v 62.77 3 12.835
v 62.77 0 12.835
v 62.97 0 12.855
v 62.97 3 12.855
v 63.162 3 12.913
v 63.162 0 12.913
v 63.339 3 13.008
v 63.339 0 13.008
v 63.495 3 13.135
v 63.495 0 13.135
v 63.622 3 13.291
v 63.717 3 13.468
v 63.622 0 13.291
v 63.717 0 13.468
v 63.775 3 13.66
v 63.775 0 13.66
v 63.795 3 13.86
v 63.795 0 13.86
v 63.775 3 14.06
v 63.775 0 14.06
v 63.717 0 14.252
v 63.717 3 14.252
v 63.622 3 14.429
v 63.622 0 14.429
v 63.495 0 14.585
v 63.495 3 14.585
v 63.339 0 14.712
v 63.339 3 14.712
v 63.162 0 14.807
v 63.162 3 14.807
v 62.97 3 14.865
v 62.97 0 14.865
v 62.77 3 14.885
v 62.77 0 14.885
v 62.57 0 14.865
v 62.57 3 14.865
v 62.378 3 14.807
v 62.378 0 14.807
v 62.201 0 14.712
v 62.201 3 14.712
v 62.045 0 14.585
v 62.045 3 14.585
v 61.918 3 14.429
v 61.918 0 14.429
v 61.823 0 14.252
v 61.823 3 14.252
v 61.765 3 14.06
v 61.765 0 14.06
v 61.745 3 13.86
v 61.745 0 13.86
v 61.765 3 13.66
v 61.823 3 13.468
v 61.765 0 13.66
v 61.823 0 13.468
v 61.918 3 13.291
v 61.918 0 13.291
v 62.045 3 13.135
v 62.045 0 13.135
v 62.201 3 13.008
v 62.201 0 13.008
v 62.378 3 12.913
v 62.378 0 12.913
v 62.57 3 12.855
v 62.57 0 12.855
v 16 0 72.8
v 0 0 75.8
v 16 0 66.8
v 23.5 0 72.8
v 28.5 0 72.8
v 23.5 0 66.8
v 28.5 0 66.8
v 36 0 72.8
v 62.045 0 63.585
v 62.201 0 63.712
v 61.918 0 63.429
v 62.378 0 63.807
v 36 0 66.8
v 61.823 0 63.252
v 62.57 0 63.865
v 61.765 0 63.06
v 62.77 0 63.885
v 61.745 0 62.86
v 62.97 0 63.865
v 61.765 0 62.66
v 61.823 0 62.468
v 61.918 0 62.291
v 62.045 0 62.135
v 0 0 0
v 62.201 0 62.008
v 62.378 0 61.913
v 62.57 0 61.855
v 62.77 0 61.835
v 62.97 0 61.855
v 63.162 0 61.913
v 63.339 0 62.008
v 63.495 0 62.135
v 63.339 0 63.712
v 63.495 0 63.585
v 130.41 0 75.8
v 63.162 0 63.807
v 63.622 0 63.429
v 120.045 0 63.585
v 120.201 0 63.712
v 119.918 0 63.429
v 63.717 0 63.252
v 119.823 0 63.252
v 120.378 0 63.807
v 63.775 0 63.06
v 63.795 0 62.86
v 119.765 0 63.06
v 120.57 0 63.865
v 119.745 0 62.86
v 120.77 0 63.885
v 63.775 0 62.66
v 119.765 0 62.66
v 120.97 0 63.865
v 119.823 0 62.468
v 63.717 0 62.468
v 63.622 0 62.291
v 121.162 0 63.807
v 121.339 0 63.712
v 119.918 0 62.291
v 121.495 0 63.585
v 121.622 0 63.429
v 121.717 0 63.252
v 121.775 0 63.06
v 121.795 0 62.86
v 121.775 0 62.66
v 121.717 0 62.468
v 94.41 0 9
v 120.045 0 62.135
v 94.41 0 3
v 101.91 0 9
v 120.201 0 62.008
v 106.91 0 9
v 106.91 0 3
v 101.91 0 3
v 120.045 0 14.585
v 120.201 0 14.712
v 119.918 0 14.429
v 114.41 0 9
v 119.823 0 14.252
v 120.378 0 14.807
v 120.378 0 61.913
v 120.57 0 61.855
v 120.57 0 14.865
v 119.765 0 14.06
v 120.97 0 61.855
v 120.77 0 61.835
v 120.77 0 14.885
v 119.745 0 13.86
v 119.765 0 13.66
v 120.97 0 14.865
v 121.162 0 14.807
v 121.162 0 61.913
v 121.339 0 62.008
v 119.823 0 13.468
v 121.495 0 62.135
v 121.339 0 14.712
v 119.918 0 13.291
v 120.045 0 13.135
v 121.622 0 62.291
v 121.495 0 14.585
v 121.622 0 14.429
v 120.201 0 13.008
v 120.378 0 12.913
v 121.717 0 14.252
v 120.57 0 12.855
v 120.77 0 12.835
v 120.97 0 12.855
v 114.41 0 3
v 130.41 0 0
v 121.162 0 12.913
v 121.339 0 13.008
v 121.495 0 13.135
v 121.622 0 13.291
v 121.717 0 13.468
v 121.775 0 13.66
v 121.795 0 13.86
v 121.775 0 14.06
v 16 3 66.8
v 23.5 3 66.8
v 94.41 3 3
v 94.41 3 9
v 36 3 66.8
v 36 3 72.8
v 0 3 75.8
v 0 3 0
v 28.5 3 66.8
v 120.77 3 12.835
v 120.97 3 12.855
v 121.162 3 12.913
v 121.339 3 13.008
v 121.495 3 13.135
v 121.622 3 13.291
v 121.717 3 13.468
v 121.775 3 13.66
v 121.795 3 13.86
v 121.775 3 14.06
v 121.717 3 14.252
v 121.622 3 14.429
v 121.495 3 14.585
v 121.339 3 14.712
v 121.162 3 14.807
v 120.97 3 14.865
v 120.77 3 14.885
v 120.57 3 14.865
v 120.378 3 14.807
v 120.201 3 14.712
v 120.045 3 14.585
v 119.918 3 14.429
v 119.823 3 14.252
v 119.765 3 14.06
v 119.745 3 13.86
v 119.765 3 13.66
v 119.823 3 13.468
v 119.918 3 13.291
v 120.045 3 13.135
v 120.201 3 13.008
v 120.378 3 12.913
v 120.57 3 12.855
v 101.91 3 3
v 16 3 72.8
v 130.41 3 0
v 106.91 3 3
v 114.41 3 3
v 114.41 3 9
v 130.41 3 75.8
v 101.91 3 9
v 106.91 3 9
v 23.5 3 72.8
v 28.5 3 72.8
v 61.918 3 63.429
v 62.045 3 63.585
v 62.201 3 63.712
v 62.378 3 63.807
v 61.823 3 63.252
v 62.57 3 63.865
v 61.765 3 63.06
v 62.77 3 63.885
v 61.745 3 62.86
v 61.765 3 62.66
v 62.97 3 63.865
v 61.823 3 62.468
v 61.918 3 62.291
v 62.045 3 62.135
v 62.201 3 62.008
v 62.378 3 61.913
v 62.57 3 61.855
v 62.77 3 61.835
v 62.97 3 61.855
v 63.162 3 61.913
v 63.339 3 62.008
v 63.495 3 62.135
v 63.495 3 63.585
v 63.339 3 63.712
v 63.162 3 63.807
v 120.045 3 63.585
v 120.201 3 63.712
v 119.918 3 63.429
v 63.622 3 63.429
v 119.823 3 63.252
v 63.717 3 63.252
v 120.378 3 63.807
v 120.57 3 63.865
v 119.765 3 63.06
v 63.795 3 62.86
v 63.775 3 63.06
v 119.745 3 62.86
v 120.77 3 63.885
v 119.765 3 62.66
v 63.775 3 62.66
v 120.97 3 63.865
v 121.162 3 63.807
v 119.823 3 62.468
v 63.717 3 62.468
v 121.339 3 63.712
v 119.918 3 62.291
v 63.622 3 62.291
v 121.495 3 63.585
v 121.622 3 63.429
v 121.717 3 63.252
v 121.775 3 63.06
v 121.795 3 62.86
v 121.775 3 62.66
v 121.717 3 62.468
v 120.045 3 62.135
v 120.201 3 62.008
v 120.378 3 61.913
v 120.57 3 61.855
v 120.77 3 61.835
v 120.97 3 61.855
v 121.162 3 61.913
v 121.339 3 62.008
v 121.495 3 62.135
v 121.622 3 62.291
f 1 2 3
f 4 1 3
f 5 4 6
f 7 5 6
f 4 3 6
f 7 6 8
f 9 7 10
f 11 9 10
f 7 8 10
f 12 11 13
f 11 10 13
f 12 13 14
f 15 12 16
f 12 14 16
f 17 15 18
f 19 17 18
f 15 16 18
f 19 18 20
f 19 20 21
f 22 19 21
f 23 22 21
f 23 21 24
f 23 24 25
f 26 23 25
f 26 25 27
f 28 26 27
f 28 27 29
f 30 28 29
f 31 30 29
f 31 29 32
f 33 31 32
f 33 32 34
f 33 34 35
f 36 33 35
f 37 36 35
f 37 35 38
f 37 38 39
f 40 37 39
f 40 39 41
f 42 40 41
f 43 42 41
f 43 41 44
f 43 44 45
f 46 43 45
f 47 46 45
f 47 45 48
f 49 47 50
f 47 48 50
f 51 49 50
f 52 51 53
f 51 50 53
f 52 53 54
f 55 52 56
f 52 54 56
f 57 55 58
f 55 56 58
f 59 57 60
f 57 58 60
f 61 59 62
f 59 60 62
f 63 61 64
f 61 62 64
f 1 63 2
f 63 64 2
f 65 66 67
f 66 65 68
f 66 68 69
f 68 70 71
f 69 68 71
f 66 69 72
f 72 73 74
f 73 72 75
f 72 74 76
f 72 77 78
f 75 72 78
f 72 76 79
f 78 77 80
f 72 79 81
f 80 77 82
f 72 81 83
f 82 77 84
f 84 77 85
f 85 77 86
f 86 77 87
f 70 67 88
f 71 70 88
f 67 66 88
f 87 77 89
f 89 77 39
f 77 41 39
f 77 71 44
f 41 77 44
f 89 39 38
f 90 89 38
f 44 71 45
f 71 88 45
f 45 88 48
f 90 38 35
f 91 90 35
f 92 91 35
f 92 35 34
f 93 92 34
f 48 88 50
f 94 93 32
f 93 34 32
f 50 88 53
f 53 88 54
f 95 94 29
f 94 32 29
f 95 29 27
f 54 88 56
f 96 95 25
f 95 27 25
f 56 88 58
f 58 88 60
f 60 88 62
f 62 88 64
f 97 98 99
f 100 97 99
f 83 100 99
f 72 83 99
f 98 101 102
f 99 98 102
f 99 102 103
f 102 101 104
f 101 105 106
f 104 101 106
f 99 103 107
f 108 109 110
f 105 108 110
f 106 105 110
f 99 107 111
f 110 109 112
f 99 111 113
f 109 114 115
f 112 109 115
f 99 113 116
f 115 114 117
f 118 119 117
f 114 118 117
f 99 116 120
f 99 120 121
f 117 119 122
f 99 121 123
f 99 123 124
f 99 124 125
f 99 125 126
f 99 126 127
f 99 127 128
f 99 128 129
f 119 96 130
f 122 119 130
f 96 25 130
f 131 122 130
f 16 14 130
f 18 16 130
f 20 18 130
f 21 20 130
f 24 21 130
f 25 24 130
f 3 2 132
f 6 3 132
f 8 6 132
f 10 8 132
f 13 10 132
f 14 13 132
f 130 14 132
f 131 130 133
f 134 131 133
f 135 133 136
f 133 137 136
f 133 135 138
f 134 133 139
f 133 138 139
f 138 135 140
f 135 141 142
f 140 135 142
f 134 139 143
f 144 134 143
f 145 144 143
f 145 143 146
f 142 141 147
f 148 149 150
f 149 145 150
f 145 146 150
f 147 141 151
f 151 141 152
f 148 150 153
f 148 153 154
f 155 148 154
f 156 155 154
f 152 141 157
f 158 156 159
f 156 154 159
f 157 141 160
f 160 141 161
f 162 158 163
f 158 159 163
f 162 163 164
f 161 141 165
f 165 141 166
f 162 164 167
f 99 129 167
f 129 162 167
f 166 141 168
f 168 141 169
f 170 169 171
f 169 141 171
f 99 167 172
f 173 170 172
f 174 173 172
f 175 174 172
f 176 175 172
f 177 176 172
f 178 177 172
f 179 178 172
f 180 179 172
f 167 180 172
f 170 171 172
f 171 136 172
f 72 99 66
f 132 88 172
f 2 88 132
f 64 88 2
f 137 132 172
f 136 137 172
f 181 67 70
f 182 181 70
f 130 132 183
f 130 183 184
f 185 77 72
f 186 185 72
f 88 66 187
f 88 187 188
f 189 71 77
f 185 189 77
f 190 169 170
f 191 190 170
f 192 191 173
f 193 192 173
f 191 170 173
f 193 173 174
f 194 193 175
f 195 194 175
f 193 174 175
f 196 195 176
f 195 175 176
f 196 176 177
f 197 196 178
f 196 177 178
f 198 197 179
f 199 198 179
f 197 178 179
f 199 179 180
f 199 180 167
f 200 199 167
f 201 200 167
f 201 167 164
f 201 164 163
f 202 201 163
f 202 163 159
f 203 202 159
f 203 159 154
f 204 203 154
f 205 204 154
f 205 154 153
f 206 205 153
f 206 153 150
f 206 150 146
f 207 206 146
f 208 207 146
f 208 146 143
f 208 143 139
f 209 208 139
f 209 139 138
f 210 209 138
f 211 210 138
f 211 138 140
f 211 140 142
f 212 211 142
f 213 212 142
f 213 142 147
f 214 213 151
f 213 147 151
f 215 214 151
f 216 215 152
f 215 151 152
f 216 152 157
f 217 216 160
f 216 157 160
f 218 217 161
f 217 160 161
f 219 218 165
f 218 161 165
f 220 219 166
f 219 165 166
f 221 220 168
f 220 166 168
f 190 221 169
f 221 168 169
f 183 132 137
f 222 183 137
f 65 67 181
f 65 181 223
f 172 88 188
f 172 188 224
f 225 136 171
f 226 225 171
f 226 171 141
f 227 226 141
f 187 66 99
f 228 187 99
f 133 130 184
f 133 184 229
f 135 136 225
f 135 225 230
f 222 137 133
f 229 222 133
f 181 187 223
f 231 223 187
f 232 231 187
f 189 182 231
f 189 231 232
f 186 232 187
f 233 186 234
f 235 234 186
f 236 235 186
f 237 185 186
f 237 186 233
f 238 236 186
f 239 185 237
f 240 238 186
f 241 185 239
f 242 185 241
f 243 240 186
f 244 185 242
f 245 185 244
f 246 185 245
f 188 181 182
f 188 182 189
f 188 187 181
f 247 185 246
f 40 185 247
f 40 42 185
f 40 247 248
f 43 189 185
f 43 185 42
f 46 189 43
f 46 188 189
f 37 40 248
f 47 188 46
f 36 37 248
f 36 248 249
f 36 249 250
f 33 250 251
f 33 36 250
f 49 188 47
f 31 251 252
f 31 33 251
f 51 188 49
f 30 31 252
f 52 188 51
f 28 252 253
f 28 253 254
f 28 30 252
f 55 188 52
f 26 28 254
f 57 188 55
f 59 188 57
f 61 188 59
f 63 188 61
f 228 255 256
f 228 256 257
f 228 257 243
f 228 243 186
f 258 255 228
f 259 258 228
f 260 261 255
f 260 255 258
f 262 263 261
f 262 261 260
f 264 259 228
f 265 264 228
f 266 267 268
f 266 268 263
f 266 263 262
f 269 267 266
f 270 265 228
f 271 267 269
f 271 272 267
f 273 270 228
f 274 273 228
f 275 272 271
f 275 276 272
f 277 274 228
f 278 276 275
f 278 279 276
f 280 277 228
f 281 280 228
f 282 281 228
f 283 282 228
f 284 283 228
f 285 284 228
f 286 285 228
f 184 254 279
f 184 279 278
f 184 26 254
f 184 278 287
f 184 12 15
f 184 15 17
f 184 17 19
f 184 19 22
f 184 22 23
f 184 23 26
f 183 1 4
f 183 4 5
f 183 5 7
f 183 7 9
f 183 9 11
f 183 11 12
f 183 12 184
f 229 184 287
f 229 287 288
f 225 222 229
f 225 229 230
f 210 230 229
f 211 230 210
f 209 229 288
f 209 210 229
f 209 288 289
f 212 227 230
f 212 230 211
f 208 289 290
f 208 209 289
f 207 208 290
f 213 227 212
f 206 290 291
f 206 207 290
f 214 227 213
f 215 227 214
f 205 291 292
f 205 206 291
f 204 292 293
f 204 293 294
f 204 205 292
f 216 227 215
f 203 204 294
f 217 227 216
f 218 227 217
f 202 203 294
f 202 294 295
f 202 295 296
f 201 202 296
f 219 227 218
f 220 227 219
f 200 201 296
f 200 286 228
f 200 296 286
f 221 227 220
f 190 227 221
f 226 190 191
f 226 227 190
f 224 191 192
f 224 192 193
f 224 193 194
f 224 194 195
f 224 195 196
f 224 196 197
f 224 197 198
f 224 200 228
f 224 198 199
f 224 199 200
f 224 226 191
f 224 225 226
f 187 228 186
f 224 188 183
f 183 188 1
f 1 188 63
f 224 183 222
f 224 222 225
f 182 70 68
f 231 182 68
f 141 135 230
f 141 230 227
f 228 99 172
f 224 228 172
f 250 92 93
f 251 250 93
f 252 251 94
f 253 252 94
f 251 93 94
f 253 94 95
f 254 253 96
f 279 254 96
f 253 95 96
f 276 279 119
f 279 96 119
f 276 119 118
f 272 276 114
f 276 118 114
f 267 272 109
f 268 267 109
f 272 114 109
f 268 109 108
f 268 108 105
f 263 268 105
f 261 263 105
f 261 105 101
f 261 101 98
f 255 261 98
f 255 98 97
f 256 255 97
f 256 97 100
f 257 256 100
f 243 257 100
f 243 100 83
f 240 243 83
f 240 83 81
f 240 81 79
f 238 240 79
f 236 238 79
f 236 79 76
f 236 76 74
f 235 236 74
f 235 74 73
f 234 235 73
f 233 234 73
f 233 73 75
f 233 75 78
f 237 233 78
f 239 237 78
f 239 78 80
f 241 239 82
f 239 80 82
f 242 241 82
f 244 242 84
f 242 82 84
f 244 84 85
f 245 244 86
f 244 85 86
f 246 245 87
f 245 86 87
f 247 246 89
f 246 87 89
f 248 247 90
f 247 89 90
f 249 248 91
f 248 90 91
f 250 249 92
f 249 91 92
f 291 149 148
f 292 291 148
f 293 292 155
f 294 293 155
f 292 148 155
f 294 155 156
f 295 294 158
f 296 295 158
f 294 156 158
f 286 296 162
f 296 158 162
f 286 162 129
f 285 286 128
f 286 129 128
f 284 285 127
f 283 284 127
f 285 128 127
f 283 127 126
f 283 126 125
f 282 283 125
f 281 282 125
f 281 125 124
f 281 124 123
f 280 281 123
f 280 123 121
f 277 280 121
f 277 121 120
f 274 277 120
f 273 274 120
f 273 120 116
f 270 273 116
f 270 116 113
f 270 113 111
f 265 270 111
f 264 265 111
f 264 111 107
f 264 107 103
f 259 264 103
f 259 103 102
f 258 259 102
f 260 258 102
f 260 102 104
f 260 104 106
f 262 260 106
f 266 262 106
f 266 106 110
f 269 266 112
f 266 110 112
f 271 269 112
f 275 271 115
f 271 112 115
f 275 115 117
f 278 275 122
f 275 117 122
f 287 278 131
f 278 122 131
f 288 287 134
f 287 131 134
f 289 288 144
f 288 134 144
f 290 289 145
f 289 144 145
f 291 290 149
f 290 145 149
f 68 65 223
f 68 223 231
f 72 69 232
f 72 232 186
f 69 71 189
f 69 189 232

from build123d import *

# Parameters (mm, degrees)
SKETCH1_W           = 130.41
SKETCH1_H           = 75.8
BOSS_EXTRUDE1_DEPTH = 3
SKETCH5_W           = 7.5
SKETCH5_H           = 6
CUT_EXTRUDE4_DEPTH  = 151.868844033
SKETCH6_W           = 7.5
SKETCH6_H           = 6
CUT_EXTRUDE5_DEPTH  = 151.868844033
SKETCH8_R           = 1.025
CUT_EXTRUDE7_DEPTH  = 151.868844033
SKETCH9_R           = 1.025
CUT_EXTRUDE8_DEPTH  = 151.868844033


with BuildPart() as part:
    # Sketch1 → Boss-Extrude1 (new body)
    with BuildSketch(Plane(origin=(0, 0, 0), x_dir=(1, 0, 0), z_dir=(0, 1, 0))):
        with Locations((65.205, -37.9)):
            Rectangle(SKETCH1_W, SKETCH1_H)
    extrude(amount=BOSS_EXTRUDE1_DEPTH)

    # Sketch5 → Cut-Extrude4 (cut, through all)
    with BuildSketch(Plane.XZ):
        with Locations((32.25, 69.8)):
            Rectangle(SKETCH5_W, SKETCH5_H)
        with Locations((19.75, 69.8)):
            Rectangle(SKETCH5_W, SKETCH5_H)
    extrude(amount=-CUT_EXTRUDE4_DEPTH, mode=Mode.SUBTRACT)

    # Sketch6 → Cut-Extrude5 (cut, through all)
    with BuildSketch(Plane.XZ):
        with Locations((98.16, 6)):
            Rectangle(SKETCH6_W, SKETCH6_H)
        with Locations((110.66, 6)):
            Rectangle(SKETCH6_W, SKETCH6_H)
    extrude(amount=-CUT_EXTRUDE5_DEPTH, mode=Mode.SUBTRACT)

    # Sketch8 → Cut-Extrude7 (cut, through all)
    with BuildSketch(Plane.XZ):
        with Locations(Location((120.77, 13.86, 0), (0, 0, 270))):
            Circle(SKETCH8_R)
        with Locations(Location((120.77, 62.86, 0), (0, 0, 270))):
            Circle(SKETCH8_R)
    extrude(amount=-CUT_EXTRUDE7_DEPTH, mode=Mode.SUBTRACT)

    # Sketch9 → Cut-Extrude8 (cut, through all)
    with BuildSketch(Plane.XZ):
        with Locations(Location((62.77, 13.86, 0), (0, 0, 270))):
            Circle(SKETCH9_R)
        with Locations(Location((62.77, 62.86, 0), (0, 0, 270))):
            Circle(SKETCH9_R)
    extrude(amount=-CUT_EXTRUDE8_DEPTH, mode=Mode.SUBTRACT)


solid = part.part
